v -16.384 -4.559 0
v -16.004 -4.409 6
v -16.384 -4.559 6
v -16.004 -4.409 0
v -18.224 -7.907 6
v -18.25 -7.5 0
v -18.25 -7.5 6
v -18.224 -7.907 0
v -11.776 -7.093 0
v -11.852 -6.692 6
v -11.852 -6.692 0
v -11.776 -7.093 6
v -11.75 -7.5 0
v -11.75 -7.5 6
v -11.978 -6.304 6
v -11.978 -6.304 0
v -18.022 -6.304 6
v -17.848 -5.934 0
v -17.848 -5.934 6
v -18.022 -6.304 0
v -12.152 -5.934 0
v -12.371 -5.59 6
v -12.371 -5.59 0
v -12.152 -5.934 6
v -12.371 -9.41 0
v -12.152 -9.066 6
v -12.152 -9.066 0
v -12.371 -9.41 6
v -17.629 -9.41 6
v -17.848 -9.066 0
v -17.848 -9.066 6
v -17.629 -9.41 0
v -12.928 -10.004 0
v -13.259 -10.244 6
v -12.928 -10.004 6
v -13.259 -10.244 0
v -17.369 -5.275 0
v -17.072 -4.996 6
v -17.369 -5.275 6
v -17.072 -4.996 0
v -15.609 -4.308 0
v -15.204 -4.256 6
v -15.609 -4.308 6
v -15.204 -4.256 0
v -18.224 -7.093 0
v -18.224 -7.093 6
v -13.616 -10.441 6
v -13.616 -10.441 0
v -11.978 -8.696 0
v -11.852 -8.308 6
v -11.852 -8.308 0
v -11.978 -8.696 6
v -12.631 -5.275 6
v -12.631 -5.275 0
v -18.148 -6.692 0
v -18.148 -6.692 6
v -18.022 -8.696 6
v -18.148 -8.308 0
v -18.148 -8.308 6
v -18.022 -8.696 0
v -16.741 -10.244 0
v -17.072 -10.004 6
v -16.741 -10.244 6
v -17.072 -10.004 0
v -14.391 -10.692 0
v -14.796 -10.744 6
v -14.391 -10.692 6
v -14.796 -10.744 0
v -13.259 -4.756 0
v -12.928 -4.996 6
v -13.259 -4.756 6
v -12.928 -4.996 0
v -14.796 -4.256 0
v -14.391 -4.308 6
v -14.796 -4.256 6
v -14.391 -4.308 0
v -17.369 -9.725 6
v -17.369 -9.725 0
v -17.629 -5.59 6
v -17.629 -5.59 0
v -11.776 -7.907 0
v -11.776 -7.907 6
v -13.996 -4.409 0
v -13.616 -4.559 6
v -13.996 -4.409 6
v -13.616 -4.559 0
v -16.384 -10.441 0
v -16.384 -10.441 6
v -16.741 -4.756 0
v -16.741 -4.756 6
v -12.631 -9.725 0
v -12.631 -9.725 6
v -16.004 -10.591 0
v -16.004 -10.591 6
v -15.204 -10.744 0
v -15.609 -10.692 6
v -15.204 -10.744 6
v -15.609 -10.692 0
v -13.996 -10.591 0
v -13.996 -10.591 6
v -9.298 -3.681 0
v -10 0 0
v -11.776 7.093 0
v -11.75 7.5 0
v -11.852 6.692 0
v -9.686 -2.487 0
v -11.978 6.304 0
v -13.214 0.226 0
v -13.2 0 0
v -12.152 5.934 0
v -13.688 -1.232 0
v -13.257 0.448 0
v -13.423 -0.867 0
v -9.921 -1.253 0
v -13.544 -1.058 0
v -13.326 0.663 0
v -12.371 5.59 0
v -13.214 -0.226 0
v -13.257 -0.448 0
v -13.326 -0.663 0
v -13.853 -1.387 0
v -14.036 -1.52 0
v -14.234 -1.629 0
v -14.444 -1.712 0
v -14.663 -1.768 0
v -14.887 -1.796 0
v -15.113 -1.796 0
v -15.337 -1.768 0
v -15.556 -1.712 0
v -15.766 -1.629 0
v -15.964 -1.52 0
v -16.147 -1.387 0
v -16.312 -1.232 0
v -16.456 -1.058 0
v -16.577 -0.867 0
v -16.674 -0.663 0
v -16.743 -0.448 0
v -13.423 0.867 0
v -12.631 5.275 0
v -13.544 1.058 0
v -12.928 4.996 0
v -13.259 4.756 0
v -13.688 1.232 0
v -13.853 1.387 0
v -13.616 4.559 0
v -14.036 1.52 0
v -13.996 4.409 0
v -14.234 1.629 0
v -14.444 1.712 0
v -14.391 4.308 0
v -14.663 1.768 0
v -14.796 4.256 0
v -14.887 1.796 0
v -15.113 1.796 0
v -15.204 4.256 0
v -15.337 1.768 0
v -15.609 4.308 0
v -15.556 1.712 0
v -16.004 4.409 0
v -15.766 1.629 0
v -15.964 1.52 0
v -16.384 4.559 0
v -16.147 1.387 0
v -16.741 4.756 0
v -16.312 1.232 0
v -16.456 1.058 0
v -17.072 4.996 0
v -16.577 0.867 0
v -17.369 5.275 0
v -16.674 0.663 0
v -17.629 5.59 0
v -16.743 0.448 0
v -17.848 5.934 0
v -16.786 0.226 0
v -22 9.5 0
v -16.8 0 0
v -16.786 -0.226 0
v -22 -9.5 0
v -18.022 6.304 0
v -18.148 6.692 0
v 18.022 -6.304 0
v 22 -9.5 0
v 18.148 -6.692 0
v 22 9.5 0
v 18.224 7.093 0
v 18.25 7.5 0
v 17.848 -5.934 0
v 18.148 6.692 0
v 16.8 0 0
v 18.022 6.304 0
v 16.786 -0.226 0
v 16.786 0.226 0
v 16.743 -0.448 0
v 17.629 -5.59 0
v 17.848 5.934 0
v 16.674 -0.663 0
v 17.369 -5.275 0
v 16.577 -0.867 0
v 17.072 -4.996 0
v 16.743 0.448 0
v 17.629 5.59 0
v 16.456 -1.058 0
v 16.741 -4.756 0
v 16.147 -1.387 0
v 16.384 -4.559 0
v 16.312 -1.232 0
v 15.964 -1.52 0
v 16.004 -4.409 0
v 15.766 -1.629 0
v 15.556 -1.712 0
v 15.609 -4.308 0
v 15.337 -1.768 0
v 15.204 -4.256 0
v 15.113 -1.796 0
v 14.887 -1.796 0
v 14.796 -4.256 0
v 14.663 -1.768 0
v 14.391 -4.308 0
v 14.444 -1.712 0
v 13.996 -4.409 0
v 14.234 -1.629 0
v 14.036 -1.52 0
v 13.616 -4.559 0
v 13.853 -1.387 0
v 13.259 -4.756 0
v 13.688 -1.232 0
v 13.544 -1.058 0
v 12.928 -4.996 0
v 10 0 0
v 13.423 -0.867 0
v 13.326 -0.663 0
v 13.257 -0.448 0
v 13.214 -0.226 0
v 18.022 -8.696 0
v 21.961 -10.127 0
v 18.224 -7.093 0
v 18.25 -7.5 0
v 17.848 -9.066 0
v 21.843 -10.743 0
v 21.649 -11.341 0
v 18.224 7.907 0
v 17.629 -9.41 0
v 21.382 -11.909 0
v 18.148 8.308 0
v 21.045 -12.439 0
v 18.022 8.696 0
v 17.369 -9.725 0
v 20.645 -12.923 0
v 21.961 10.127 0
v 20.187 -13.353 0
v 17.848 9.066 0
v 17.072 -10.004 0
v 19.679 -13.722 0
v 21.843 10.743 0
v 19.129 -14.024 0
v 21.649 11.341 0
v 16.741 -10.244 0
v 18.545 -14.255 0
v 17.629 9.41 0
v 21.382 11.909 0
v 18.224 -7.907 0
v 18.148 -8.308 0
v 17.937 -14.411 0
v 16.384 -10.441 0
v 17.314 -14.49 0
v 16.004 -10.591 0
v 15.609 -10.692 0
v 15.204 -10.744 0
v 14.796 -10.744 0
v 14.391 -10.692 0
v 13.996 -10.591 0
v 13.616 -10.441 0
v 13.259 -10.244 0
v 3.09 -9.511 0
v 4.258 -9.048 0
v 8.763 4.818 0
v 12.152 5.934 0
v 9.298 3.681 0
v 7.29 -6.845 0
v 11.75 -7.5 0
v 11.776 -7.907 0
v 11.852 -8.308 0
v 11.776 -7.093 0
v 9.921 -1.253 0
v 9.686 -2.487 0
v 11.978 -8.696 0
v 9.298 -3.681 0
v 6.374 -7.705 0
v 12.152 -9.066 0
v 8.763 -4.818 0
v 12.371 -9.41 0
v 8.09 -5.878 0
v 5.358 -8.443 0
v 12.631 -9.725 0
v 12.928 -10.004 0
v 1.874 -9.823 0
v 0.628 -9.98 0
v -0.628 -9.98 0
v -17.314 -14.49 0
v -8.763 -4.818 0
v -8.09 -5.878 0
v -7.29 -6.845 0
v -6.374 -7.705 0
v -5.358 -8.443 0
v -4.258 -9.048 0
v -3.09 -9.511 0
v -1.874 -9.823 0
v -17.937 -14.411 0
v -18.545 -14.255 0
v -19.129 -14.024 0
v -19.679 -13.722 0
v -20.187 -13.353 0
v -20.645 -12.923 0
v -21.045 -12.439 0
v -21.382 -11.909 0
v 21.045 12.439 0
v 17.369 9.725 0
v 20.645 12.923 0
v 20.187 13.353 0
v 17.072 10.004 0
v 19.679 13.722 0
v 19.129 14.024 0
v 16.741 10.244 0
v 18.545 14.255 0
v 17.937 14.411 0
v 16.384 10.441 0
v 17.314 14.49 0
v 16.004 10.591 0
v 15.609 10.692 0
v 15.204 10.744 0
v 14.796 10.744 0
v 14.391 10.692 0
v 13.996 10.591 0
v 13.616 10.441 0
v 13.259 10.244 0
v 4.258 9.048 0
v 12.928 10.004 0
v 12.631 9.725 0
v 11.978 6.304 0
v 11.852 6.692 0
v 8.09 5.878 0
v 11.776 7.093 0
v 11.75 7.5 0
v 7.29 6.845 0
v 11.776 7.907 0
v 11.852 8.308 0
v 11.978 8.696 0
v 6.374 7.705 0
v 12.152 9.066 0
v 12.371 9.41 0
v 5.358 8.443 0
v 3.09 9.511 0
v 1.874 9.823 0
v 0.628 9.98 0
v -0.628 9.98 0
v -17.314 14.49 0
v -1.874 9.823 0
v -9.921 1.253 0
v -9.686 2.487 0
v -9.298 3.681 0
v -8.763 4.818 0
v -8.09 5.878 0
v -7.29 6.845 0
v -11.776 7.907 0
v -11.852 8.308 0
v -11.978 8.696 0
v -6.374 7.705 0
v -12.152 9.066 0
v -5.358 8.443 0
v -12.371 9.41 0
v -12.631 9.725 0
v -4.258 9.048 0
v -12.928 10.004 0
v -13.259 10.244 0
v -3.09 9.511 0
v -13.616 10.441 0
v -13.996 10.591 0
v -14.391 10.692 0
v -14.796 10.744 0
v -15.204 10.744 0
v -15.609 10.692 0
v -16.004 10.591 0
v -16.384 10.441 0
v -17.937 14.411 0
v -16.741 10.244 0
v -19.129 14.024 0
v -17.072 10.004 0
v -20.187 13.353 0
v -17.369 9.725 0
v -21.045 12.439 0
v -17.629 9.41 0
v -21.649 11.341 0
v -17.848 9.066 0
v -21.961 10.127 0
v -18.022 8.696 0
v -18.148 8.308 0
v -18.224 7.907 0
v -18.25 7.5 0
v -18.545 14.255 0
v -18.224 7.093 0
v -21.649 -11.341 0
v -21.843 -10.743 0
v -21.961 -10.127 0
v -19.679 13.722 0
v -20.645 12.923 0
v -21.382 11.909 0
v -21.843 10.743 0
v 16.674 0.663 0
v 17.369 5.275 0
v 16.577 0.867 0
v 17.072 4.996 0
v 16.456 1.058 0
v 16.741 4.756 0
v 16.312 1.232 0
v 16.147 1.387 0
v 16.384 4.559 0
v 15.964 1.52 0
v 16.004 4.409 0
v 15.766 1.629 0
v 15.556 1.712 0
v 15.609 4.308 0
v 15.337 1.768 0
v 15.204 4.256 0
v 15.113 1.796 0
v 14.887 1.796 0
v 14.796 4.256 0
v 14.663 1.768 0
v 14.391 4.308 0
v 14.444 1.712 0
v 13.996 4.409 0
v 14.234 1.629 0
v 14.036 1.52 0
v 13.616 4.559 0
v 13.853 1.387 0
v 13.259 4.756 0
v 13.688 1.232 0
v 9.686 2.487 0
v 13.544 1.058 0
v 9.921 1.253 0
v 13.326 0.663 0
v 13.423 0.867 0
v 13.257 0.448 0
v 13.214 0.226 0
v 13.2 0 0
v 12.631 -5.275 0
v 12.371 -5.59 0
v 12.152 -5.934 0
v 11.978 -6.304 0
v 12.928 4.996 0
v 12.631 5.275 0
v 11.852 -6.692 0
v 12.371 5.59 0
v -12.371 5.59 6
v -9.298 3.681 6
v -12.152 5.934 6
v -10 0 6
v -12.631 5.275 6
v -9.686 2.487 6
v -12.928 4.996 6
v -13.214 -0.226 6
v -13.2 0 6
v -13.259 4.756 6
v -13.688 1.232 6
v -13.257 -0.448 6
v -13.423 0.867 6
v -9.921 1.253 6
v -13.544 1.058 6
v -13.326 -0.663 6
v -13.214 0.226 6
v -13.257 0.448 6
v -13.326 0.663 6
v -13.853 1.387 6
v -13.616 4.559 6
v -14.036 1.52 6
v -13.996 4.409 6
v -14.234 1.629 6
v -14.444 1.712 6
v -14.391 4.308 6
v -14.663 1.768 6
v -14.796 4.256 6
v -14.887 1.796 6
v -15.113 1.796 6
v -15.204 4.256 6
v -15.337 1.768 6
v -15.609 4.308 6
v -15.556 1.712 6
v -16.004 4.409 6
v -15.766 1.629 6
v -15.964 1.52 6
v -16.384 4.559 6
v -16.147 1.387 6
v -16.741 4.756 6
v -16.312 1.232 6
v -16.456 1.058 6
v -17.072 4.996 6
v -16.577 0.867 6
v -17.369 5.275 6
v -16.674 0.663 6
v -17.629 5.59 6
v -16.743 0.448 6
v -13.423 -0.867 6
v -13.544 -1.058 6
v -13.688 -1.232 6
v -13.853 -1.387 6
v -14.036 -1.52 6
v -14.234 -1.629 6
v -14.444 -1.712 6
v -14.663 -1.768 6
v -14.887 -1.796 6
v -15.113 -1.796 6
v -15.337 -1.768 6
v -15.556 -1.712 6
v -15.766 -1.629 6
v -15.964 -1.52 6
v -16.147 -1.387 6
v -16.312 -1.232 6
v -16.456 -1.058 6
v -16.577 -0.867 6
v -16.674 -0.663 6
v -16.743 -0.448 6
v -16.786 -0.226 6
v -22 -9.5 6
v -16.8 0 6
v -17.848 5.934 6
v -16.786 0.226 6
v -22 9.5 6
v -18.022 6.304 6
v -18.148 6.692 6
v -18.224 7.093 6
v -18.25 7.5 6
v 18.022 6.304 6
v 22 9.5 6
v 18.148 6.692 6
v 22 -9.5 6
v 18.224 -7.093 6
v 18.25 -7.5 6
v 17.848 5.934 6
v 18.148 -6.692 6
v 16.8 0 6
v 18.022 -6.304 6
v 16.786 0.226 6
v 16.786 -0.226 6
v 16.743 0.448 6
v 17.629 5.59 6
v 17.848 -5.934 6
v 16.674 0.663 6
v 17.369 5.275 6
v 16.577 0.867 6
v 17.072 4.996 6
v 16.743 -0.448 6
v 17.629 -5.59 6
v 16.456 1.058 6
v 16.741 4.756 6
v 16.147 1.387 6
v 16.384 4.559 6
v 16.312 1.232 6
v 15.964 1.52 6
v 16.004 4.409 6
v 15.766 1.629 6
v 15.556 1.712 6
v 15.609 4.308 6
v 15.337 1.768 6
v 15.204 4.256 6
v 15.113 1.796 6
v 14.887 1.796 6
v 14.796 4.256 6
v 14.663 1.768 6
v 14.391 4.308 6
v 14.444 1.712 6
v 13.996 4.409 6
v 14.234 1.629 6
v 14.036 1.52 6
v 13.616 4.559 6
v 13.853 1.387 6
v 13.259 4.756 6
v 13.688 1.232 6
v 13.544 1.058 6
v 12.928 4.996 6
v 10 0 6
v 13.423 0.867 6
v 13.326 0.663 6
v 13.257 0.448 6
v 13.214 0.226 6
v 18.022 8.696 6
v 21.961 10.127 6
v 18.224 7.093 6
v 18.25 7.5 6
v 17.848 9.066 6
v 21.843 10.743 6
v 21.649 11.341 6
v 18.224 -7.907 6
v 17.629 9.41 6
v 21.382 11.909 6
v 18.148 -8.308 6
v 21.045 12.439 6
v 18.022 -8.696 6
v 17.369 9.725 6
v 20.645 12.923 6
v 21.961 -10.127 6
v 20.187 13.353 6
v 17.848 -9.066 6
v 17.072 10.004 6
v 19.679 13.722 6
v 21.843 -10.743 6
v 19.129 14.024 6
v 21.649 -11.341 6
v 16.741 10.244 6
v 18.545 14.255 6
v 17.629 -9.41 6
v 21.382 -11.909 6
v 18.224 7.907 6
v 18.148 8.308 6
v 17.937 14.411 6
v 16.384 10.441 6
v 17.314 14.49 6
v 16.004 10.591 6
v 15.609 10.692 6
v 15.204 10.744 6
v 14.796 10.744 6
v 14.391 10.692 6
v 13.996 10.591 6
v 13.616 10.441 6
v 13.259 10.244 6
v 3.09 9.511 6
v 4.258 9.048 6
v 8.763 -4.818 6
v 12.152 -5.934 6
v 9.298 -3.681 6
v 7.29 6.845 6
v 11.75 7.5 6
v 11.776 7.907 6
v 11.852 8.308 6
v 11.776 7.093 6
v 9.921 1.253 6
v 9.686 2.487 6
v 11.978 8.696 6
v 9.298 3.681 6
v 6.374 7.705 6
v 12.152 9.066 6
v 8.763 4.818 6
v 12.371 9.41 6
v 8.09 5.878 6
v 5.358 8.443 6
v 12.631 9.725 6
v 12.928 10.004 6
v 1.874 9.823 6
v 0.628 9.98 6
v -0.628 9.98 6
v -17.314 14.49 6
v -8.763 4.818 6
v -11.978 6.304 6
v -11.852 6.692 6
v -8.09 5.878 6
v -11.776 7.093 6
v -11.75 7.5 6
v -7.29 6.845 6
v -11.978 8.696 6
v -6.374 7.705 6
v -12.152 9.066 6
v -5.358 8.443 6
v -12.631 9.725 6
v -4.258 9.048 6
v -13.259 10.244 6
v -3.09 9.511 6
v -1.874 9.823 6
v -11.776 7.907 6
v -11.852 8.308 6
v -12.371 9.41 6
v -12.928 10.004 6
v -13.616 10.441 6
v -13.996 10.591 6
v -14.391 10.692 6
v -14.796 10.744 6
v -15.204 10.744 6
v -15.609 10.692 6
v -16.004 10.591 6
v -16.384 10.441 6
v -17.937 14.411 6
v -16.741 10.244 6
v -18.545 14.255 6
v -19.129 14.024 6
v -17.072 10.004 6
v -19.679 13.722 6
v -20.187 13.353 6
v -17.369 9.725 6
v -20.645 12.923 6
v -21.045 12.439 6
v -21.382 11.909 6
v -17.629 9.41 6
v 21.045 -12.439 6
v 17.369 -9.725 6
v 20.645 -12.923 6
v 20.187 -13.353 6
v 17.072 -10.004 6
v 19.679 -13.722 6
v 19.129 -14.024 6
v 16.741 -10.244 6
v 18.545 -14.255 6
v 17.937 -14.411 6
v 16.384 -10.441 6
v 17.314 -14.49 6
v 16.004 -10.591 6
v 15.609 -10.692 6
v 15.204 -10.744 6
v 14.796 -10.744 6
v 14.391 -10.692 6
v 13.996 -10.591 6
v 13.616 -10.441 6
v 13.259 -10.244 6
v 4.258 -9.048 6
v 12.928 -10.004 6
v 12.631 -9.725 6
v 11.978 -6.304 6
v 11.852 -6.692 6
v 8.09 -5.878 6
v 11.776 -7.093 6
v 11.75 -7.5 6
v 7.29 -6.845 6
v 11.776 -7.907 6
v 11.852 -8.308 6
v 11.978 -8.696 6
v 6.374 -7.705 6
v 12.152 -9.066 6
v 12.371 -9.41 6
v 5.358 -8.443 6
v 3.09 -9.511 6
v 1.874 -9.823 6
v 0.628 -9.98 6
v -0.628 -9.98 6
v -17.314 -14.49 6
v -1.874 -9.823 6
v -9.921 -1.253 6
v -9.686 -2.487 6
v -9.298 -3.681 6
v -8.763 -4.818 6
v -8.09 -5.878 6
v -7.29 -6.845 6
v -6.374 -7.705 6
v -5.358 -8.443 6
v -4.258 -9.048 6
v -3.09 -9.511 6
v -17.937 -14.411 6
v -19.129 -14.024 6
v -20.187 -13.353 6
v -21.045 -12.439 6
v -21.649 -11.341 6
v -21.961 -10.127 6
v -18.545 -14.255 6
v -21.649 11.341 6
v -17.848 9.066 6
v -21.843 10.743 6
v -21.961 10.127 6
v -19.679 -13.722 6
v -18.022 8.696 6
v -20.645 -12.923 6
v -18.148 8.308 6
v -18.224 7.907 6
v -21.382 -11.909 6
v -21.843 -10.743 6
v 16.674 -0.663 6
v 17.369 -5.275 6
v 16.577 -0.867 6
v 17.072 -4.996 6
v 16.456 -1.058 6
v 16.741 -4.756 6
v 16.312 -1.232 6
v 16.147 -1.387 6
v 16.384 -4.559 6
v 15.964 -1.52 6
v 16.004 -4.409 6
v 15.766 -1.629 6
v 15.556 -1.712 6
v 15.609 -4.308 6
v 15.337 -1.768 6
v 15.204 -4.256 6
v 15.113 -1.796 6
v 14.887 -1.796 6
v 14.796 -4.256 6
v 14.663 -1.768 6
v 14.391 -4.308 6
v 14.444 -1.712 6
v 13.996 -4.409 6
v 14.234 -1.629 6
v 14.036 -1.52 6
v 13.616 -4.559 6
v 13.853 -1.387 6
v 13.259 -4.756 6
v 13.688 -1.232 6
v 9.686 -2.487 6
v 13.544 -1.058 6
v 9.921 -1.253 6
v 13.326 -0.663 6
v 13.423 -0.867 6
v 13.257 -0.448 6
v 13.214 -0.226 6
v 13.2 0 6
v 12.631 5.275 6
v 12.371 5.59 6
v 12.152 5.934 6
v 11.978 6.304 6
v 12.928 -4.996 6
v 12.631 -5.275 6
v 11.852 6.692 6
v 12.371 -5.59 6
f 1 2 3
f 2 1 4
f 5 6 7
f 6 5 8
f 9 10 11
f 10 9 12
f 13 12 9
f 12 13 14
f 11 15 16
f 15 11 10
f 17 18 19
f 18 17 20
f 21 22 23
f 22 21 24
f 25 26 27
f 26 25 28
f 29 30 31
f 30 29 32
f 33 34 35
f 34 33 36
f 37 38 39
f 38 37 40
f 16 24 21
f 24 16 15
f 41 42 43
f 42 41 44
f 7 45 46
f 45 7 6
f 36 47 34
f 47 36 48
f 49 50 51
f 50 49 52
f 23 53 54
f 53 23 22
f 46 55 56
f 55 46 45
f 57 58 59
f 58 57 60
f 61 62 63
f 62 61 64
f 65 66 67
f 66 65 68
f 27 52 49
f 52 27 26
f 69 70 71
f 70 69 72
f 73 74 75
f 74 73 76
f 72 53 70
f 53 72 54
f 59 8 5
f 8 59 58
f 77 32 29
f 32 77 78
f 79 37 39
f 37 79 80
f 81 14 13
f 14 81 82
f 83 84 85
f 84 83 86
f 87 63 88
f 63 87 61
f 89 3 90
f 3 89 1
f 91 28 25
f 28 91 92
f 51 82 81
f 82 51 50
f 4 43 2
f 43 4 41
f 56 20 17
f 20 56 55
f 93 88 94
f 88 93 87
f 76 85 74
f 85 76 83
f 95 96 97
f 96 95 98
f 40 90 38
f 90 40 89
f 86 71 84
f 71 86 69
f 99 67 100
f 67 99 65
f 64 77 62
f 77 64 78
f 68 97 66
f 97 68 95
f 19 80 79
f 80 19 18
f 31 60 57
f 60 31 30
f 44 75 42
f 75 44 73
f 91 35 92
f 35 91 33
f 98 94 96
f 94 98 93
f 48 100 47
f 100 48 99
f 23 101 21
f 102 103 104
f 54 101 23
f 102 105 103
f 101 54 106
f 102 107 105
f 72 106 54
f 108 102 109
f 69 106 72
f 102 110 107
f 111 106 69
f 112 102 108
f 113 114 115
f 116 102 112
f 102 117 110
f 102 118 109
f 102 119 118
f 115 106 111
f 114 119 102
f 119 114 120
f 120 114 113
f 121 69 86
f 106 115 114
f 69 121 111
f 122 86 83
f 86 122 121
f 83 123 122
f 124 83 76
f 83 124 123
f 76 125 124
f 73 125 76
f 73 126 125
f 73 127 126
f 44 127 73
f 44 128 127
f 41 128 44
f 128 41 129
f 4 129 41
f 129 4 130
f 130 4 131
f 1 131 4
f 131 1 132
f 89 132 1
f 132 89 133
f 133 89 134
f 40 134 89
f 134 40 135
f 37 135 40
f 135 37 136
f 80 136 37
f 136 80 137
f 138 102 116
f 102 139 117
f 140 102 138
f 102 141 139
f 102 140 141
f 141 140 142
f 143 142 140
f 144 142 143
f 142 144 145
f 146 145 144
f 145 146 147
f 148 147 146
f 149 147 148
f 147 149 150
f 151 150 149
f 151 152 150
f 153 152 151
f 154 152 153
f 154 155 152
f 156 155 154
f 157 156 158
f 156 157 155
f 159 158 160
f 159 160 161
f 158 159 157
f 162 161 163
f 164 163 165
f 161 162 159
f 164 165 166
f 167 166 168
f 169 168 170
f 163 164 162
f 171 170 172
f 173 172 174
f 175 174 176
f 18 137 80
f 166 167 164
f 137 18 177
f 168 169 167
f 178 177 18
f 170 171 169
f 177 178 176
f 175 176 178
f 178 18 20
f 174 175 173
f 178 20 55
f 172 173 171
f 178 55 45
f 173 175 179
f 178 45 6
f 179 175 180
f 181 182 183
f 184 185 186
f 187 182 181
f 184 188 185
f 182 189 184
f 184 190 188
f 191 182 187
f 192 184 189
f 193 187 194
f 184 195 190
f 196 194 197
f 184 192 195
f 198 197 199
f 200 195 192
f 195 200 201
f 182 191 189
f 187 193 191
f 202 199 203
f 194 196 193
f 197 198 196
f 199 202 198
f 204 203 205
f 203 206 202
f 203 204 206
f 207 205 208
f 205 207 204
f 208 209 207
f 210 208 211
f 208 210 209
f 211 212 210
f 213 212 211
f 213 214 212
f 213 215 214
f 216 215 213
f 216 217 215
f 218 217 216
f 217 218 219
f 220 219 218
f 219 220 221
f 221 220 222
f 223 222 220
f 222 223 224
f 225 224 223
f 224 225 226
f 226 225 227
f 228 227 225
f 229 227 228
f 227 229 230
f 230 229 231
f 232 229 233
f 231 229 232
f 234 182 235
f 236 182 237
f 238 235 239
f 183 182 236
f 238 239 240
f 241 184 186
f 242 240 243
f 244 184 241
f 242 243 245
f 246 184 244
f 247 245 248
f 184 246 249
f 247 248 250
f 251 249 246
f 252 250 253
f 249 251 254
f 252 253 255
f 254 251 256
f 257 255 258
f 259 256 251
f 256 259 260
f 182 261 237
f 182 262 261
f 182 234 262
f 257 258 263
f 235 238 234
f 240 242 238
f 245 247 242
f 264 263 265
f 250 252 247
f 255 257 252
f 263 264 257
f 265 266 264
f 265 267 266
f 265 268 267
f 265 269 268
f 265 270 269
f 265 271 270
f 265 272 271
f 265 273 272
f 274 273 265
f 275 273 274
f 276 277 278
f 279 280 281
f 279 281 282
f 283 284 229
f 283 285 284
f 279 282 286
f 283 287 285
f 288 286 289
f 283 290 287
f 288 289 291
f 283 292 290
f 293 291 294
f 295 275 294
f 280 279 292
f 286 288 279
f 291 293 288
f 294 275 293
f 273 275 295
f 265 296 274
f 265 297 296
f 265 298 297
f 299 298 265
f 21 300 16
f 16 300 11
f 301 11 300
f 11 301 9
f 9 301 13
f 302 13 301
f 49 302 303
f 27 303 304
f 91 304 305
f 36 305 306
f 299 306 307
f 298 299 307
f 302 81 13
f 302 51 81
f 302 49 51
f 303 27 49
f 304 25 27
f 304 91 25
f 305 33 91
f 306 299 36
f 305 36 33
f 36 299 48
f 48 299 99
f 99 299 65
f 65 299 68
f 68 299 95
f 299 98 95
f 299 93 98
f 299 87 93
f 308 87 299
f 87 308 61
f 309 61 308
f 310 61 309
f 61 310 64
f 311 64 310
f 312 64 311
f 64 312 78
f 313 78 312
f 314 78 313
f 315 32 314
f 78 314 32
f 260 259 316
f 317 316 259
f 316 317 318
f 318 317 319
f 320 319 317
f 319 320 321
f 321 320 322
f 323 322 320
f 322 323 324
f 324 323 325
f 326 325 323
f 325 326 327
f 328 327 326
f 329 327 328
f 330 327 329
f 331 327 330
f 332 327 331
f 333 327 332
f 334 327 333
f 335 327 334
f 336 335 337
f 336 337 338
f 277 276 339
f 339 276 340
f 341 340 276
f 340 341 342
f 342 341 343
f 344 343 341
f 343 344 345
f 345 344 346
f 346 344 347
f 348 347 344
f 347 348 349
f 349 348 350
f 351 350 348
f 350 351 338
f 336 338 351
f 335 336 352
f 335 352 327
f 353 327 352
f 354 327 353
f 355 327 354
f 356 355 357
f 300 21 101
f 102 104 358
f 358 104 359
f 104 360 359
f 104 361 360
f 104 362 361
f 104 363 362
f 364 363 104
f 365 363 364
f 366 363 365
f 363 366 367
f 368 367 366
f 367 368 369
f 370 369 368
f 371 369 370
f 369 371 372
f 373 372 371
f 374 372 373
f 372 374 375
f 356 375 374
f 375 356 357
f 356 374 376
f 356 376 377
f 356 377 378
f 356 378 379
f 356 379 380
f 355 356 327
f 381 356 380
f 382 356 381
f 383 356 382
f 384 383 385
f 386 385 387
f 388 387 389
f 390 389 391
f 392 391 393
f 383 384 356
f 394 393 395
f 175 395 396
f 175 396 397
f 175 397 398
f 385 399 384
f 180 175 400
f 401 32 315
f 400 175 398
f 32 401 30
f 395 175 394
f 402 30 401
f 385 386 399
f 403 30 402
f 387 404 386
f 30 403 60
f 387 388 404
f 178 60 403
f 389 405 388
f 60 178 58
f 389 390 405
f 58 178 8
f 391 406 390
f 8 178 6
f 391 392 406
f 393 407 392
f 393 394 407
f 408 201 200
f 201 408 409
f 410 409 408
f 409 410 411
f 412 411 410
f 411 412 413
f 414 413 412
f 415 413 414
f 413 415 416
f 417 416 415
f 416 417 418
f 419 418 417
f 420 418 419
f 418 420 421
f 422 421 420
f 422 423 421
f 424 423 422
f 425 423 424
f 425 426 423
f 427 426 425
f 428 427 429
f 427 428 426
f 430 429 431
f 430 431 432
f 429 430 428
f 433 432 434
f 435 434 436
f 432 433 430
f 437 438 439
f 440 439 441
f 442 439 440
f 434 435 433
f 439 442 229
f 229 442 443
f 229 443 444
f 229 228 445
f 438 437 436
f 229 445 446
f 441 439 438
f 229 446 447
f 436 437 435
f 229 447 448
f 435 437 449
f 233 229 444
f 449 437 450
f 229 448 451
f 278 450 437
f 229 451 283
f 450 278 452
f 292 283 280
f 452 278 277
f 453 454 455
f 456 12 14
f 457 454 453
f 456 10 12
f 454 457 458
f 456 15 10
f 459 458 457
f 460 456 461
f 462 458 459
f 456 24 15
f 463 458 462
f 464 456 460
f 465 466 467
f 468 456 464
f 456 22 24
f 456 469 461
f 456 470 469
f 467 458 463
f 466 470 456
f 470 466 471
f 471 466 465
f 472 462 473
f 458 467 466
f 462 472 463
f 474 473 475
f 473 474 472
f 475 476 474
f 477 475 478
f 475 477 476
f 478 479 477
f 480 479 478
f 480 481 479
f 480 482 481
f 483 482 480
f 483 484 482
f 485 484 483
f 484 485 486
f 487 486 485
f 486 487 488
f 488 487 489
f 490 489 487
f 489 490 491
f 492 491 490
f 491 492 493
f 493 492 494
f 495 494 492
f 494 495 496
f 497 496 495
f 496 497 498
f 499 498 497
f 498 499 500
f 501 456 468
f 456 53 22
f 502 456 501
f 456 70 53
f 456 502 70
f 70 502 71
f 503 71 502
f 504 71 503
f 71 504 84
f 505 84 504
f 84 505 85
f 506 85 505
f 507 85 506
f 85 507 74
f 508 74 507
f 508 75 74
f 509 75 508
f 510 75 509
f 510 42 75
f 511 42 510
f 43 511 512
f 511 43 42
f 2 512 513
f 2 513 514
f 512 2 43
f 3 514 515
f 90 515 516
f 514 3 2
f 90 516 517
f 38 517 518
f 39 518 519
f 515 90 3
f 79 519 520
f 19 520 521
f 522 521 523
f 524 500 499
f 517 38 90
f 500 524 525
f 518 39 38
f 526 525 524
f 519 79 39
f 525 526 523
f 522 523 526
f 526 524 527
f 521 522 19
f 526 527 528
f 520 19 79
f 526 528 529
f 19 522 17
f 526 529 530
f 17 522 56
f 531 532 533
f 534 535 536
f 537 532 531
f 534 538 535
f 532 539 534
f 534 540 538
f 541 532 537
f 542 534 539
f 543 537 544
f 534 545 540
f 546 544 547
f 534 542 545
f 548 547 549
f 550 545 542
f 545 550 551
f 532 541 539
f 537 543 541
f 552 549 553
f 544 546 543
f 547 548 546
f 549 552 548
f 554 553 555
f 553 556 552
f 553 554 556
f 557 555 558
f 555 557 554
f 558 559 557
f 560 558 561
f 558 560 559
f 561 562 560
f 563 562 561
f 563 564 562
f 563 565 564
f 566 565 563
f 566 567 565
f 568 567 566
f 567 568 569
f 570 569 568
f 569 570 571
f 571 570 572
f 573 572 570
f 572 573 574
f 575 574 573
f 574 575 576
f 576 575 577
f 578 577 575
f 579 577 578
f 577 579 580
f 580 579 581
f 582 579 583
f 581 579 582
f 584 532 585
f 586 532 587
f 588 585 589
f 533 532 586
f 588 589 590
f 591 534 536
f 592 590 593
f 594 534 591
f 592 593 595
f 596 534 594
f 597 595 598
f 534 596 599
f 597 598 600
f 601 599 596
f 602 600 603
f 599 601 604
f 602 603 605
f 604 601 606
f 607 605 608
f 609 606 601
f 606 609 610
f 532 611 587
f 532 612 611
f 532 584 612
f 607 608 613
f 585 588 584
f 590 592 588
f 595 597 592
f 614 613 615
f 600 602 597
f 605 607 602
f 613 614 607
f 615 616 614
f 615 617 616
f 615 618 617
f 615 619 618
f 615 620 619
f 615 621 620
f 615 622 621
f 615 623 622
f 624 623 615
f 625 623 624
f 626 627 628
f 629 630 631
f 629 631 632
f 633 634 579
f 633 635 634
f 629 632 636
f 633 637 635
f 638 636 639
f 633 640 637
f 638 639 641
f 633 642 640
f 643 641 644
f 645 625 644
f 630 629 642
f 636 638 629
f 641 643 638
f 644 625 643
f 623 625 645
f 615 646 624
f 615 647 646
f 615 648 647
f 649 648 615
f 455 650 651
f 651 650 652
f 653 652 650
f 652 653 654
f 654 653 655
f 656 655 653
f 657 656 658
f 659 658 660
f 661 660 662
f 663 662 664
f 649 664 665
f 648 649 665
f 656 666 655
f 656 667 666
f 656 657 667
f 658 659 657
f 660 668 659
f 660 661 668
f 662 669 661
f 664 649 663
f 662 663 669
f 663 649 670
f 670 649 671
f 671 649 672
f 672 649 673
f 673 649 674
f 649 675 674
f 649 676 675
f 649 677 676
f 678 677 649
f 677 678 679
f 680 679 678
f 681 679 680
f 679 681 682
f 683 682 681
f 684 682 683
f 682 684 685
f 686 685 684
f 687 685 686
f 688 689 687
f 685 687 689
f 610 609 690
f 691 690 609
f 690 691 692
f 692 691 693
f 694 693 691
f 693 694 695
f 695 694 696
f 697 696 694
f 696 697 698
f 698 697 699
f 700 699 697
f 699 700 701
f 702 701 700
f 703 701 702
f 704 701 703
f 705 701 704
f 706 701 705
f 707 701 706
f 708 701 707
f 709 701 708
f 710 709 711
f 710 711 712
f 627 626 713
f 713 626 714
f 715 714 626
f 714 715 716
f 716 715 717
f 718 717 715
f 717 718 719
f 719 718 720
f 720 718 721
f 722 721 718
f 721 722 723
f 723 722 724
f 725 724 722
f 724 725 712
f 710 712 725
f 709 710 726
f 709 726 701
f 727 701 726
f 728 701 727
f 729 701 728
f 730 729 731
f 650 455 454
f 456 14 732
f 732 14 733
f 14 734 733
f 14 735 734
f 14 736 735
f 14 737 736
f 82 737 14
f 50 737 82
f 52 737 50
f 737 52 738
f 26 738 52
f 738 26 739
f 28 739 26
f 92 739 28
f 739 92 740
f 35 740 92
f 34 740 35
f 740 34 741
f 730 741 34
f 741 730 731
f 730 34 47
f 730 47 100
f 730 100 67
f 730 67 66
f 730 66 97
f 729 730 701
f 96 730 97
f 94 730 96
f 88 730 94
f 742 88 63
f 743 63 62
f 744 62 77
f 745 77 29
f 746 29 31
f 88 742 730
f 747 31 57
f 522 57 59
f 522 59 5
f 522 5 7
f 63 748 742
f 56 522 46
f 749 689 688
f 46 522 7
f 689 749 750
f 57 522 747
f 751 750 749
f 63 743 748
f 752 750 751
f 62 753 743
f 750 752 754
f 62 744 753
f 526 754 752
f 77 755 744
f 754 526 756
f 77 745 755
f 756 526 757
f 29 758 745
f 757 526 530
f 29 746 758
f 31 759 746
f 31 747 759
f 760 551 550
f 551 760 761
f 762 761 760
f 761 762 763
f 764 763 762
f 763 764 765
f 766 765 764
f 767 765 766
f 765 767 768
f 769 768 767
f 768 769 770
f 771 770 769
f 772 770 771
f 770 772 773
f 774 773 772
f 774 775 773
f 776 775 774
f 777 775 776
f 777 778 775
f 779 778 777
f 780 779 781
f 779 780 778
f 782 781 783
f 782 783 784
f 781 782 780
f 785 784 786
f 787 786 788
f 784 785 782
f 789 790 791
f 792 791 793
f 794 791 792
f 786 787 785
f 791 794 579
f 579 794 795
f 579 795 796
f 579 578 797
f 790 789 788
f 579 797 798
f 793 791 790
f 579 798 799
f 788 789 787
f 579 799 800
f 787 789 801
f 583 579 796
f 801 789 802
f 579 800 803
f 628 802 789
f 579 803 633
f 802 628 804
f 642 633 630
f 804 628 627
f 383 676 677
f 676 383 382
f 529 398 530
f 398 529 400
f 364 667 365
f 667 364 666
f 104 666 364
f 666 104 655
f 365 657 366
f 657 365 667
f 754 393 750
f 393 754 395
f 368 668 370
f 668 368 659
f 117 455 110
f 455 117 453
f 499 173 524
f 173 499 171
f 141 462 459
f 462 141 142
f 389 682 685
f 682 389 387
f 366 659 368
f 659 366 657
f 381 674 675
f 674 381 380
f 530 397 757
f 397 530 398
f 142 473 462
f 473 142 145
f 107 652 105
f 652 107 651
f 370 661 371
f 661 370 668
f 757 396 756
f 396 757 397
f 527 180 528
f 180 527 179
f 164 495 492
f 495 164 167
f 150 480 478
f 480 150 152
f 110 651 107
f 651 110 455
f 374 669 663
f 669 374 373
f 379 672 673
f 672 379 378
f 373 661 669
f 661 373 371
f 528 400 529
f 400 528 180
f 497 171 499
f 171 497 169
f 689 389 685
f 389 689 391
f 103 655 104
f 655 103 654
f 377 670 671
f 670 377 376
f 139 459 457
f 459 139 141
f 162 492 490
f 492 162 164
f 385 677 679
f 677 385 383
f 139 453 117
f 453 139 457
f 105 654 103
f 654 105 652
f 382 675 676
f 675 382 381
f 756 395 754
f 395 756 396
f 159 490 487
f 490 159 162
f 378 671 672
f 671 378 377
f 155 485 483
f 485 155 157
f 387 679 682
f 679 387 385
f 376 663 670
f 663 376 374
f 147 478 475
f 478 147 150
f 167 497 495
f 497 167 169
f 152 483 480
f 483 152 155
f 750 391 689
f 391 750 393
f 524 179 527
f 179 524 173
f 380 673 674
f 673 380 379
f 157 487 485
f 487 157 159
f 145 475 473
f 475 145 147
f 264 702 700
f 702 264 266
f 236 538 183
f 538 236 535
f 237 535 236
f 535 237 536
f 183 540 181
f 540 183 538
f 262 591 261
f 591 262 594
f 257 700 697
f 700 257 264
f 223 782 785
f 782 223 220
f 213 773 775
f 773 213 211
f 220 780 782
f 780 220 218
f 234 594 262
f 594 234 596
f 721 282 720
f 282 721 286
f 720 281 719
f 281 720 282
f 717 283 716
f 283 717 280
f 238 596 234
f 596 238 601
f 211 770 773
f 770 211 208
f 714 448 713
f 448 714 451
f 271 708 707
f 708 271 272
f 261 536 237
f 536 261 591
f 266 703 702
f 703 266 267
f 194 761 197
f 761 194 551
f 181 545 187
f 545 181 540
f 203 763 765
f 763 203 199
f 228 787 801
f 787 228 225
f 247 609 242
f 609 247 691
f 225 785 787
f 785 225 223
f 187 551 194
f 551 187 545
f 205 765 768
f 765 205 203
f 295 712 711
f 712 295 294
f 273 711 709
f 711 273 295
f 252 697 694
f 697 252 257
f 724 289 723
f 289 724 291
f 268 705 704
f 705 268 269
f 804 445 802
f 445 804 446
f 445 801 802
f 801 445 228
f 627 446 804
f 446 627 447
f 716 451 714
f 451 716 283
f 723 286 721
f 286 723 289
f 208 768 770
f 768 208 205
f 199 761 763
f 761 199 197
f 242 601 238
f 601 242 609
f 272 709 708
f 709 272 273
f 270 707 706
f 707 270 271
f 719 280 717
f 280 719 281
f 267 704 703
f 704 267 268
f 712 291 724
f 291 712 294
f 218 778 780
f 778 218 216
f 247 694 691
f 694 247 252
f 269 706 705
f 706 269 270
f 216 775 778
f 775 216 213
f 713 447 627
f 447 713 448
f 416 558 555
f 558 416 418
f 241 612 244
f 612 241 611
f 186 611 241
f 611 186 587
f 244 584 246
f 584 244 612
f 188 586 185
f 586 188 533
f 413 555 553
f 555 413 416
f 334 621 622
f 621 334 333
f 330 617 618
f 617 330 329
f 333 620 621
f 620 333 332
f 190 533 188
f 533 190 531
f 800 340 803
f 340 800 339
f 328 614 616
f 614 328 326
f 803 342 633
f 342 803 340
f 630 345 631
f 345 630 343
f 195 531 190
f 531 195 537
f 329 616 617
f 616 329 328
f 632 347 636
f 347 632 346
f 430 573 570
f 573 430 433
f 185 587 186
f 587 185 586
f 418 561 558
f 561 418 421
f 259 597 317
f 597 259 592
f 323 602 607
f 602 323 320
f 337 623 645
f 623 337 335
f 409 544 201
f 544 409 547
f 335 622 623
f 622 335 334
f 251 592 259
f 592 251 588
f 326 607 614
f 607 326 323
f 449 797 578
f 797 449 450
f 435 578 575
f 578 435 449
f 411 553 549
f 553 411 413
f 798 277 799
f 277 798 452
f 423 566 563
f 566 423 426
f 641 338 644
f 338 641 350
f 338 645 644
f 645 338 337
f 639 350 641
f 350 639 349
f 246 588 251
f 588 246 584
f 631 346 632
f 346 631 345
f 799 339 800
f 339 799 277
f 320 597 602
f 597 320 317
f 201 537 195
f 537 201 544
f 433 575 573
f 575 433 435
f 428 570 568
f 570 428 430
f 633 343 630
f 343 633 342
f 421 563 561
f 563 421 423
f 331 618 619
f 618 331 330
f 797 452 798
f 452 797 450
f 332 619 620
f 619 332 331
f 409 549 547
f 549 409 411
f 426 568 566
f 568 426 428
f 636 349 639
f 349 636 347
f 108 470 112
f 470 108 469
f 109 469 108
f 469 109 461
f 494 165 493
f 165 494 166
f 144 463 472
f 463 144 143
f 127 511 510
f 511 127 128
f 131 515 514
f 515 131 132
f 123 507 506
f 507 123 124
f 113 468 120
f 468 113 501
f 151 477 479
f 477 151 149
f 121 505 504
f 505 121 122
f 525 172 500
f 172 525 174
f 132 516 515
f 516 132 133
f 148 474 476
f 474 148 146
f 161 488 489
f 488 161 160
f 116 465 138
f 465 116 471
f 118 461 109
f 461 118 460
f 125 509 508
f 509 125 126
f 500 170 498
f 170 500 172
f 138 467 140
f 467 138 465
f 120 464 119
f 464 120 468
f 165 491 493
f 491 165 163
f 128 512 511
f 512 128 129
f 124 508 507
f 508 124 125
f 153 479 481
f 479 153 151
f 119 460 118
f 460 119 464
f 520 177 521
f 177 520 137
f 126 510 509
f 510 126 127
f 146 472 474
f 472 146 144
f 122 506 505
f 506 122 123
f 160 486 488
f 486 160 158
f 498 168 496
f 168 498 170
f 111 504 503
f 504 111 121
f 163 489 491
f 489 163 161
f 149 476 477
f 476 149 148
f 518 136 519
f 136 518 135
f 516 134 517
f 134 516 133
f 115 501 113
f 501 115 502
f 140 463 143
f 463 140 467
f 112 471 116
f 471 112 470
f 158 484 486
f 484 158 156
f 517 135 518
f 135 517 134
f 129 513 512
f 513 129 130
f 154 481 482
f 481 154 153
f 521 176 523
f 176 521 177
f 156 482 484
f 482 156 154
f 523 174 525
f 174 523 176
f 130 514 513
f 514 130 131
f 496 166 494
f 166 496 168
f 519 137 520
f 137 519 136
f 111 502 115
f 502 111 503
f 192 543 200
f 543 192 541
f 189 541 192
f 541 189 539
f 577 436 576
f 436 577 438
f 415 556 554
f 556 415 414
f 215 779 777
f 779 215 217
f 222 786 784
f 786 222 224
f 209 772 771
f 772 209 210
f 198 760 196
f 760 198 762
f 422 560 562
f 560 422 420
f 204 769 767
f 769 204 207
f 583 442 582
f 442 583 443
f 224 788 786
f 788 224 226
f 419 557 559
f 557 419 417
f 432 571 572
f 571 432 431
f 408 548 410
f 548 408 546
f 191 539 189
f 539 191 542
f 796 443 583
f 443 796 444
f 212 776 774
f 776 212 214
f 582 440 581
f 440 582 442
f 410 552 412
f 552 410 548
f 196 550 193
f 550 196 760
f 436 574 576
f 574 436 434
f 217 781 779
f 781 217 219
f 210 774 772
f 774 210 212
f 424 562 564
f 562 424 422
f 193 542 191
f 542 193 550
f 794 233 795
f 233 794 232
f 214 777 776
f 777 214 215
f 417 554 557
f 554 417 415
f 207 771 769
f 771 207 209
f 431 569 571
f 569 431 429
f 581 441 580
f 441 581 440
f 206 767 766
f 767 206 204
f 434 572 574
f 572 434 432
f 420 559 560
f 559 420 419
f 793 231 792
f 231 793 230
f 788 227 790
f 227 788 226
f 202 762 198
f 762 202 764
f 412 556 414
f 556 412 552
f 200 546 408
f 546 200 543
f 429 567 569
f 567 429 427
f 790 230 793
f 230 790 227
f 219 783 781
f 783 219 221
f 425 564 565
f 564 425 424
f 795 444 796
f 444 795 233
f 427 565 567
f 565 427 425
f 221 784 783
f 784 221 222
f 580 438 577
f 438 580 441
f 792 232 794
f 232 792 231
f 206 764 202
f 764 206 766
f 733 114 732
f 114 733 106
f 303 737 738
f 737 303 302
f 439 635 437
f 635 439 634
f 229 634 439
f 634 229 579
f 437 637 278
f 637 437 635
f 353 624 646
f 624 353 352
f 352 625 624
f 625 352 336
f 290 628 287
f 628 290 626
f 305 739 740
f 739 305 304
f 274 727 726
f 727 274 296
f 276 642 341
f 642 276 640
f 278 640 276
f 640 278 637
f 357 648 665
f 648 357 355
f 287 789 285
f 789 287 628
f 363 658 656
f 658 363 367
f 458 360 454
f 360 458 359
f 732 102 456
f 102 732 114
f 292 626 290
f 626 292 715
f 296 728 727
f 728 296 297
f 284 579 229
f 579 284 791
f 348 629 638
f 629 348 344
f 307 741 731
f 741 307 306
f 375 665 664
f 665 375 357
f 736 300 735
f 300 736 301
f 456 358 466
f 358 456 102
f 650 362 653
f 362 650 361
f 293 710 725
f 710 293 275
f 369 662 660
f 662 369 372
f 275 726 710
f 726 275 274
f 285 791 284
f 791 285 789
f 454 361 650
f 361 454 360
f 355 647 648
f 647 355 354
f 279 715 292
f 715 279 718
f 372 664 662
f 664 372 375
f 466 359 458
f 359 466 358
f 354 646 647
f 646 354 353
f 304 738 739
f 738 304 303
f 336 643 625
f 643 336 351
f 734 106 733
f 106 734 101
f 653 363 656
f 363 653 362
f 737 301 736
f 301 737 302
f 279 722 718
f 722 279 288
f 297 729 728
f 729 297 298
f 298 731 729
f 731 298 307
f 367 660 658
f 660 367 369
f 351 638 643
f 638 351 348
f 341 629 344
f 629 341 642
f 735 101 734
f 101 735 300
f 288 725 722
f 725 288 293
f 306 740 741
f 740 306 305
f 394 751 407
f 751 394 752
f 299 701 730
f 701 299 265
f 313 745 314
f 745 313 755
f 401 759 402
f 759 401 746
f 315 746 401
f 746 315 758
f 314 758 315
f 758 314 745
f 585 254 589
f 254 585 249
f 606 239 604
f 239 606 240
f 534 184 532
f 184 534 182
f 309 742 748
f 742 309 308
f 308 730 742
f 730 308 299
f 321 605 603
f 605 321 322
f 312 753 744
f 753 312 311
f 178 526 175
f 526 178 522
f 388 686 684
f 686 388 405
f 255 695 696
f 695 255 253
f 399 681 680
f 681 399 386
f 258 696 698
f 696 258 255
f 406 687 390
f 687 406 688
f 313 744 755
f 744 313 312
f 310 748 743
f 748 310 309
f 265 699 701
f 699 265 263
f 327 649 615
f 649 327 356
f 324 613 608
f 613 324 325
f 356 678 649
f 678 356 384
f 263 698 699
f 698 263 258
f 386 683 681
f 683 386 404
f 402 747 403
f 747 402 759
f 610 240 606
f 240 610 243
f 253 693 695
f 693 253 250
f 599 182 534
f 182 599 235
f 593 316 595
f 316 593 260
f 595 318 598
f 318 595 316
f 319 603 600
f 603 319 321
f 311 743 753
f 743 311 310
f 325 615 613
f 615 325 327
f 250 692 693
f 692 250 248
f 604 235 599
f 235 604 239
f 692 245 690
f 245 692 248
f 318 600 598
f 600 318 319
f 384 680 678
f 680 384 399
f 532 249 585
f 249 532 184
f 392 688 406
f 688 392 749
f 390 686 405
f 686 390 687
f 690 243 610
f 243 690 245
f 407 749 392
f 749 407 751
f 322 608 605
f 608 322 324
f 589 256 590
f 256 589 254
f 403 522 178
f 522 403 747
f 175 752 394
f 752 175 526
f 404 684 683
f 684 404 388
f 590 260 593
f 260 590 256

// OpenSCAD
$fn = 50;

difference() {
	union() {
		hull() {
			translate(v = [-17.0, 9.5, 0]) {
				cylinder(h = 6, r = 5);
			}
			translate(v = [17.0, 9.5, 0]) {
				cylinder(h = 6, r = 5);
			}
			translate(v = [-17.0, -9.5, 0]) {
				cylinder(h = 6, r = 5);
			}
			translate(v = [17.0, -9.5, 0]) {
				cylinder(h = 6, r = 5);
			}
		}
	}
	union() {
		translate(v = [-15.0, -7.5, 0]) {
			cylinder(h = 6, r = 3.25);
		}
		translate(v = [-15.0, 7.5, 0]) {
			cylinder(h = 6, r = 3.25);
		}
		translate(v = [15.0, -7.5, 0]) {
			cylinder(h = 6, r = 3.25);
		}
		translate(v = [15.0, 7.5, 0]) {
			cylinder(h = 6, r = 3.25);
		}
		translate(v = [-15.0, 0.0, 0]) {
			cylinder(h = 6, r = 1.8);
		}
		translate(v = [15.0, 0.0, 0]) {
			cylinder(h = 6, r = 1.8);
		}
		cylinder(h = 6, r = 10.0);
	}
}
